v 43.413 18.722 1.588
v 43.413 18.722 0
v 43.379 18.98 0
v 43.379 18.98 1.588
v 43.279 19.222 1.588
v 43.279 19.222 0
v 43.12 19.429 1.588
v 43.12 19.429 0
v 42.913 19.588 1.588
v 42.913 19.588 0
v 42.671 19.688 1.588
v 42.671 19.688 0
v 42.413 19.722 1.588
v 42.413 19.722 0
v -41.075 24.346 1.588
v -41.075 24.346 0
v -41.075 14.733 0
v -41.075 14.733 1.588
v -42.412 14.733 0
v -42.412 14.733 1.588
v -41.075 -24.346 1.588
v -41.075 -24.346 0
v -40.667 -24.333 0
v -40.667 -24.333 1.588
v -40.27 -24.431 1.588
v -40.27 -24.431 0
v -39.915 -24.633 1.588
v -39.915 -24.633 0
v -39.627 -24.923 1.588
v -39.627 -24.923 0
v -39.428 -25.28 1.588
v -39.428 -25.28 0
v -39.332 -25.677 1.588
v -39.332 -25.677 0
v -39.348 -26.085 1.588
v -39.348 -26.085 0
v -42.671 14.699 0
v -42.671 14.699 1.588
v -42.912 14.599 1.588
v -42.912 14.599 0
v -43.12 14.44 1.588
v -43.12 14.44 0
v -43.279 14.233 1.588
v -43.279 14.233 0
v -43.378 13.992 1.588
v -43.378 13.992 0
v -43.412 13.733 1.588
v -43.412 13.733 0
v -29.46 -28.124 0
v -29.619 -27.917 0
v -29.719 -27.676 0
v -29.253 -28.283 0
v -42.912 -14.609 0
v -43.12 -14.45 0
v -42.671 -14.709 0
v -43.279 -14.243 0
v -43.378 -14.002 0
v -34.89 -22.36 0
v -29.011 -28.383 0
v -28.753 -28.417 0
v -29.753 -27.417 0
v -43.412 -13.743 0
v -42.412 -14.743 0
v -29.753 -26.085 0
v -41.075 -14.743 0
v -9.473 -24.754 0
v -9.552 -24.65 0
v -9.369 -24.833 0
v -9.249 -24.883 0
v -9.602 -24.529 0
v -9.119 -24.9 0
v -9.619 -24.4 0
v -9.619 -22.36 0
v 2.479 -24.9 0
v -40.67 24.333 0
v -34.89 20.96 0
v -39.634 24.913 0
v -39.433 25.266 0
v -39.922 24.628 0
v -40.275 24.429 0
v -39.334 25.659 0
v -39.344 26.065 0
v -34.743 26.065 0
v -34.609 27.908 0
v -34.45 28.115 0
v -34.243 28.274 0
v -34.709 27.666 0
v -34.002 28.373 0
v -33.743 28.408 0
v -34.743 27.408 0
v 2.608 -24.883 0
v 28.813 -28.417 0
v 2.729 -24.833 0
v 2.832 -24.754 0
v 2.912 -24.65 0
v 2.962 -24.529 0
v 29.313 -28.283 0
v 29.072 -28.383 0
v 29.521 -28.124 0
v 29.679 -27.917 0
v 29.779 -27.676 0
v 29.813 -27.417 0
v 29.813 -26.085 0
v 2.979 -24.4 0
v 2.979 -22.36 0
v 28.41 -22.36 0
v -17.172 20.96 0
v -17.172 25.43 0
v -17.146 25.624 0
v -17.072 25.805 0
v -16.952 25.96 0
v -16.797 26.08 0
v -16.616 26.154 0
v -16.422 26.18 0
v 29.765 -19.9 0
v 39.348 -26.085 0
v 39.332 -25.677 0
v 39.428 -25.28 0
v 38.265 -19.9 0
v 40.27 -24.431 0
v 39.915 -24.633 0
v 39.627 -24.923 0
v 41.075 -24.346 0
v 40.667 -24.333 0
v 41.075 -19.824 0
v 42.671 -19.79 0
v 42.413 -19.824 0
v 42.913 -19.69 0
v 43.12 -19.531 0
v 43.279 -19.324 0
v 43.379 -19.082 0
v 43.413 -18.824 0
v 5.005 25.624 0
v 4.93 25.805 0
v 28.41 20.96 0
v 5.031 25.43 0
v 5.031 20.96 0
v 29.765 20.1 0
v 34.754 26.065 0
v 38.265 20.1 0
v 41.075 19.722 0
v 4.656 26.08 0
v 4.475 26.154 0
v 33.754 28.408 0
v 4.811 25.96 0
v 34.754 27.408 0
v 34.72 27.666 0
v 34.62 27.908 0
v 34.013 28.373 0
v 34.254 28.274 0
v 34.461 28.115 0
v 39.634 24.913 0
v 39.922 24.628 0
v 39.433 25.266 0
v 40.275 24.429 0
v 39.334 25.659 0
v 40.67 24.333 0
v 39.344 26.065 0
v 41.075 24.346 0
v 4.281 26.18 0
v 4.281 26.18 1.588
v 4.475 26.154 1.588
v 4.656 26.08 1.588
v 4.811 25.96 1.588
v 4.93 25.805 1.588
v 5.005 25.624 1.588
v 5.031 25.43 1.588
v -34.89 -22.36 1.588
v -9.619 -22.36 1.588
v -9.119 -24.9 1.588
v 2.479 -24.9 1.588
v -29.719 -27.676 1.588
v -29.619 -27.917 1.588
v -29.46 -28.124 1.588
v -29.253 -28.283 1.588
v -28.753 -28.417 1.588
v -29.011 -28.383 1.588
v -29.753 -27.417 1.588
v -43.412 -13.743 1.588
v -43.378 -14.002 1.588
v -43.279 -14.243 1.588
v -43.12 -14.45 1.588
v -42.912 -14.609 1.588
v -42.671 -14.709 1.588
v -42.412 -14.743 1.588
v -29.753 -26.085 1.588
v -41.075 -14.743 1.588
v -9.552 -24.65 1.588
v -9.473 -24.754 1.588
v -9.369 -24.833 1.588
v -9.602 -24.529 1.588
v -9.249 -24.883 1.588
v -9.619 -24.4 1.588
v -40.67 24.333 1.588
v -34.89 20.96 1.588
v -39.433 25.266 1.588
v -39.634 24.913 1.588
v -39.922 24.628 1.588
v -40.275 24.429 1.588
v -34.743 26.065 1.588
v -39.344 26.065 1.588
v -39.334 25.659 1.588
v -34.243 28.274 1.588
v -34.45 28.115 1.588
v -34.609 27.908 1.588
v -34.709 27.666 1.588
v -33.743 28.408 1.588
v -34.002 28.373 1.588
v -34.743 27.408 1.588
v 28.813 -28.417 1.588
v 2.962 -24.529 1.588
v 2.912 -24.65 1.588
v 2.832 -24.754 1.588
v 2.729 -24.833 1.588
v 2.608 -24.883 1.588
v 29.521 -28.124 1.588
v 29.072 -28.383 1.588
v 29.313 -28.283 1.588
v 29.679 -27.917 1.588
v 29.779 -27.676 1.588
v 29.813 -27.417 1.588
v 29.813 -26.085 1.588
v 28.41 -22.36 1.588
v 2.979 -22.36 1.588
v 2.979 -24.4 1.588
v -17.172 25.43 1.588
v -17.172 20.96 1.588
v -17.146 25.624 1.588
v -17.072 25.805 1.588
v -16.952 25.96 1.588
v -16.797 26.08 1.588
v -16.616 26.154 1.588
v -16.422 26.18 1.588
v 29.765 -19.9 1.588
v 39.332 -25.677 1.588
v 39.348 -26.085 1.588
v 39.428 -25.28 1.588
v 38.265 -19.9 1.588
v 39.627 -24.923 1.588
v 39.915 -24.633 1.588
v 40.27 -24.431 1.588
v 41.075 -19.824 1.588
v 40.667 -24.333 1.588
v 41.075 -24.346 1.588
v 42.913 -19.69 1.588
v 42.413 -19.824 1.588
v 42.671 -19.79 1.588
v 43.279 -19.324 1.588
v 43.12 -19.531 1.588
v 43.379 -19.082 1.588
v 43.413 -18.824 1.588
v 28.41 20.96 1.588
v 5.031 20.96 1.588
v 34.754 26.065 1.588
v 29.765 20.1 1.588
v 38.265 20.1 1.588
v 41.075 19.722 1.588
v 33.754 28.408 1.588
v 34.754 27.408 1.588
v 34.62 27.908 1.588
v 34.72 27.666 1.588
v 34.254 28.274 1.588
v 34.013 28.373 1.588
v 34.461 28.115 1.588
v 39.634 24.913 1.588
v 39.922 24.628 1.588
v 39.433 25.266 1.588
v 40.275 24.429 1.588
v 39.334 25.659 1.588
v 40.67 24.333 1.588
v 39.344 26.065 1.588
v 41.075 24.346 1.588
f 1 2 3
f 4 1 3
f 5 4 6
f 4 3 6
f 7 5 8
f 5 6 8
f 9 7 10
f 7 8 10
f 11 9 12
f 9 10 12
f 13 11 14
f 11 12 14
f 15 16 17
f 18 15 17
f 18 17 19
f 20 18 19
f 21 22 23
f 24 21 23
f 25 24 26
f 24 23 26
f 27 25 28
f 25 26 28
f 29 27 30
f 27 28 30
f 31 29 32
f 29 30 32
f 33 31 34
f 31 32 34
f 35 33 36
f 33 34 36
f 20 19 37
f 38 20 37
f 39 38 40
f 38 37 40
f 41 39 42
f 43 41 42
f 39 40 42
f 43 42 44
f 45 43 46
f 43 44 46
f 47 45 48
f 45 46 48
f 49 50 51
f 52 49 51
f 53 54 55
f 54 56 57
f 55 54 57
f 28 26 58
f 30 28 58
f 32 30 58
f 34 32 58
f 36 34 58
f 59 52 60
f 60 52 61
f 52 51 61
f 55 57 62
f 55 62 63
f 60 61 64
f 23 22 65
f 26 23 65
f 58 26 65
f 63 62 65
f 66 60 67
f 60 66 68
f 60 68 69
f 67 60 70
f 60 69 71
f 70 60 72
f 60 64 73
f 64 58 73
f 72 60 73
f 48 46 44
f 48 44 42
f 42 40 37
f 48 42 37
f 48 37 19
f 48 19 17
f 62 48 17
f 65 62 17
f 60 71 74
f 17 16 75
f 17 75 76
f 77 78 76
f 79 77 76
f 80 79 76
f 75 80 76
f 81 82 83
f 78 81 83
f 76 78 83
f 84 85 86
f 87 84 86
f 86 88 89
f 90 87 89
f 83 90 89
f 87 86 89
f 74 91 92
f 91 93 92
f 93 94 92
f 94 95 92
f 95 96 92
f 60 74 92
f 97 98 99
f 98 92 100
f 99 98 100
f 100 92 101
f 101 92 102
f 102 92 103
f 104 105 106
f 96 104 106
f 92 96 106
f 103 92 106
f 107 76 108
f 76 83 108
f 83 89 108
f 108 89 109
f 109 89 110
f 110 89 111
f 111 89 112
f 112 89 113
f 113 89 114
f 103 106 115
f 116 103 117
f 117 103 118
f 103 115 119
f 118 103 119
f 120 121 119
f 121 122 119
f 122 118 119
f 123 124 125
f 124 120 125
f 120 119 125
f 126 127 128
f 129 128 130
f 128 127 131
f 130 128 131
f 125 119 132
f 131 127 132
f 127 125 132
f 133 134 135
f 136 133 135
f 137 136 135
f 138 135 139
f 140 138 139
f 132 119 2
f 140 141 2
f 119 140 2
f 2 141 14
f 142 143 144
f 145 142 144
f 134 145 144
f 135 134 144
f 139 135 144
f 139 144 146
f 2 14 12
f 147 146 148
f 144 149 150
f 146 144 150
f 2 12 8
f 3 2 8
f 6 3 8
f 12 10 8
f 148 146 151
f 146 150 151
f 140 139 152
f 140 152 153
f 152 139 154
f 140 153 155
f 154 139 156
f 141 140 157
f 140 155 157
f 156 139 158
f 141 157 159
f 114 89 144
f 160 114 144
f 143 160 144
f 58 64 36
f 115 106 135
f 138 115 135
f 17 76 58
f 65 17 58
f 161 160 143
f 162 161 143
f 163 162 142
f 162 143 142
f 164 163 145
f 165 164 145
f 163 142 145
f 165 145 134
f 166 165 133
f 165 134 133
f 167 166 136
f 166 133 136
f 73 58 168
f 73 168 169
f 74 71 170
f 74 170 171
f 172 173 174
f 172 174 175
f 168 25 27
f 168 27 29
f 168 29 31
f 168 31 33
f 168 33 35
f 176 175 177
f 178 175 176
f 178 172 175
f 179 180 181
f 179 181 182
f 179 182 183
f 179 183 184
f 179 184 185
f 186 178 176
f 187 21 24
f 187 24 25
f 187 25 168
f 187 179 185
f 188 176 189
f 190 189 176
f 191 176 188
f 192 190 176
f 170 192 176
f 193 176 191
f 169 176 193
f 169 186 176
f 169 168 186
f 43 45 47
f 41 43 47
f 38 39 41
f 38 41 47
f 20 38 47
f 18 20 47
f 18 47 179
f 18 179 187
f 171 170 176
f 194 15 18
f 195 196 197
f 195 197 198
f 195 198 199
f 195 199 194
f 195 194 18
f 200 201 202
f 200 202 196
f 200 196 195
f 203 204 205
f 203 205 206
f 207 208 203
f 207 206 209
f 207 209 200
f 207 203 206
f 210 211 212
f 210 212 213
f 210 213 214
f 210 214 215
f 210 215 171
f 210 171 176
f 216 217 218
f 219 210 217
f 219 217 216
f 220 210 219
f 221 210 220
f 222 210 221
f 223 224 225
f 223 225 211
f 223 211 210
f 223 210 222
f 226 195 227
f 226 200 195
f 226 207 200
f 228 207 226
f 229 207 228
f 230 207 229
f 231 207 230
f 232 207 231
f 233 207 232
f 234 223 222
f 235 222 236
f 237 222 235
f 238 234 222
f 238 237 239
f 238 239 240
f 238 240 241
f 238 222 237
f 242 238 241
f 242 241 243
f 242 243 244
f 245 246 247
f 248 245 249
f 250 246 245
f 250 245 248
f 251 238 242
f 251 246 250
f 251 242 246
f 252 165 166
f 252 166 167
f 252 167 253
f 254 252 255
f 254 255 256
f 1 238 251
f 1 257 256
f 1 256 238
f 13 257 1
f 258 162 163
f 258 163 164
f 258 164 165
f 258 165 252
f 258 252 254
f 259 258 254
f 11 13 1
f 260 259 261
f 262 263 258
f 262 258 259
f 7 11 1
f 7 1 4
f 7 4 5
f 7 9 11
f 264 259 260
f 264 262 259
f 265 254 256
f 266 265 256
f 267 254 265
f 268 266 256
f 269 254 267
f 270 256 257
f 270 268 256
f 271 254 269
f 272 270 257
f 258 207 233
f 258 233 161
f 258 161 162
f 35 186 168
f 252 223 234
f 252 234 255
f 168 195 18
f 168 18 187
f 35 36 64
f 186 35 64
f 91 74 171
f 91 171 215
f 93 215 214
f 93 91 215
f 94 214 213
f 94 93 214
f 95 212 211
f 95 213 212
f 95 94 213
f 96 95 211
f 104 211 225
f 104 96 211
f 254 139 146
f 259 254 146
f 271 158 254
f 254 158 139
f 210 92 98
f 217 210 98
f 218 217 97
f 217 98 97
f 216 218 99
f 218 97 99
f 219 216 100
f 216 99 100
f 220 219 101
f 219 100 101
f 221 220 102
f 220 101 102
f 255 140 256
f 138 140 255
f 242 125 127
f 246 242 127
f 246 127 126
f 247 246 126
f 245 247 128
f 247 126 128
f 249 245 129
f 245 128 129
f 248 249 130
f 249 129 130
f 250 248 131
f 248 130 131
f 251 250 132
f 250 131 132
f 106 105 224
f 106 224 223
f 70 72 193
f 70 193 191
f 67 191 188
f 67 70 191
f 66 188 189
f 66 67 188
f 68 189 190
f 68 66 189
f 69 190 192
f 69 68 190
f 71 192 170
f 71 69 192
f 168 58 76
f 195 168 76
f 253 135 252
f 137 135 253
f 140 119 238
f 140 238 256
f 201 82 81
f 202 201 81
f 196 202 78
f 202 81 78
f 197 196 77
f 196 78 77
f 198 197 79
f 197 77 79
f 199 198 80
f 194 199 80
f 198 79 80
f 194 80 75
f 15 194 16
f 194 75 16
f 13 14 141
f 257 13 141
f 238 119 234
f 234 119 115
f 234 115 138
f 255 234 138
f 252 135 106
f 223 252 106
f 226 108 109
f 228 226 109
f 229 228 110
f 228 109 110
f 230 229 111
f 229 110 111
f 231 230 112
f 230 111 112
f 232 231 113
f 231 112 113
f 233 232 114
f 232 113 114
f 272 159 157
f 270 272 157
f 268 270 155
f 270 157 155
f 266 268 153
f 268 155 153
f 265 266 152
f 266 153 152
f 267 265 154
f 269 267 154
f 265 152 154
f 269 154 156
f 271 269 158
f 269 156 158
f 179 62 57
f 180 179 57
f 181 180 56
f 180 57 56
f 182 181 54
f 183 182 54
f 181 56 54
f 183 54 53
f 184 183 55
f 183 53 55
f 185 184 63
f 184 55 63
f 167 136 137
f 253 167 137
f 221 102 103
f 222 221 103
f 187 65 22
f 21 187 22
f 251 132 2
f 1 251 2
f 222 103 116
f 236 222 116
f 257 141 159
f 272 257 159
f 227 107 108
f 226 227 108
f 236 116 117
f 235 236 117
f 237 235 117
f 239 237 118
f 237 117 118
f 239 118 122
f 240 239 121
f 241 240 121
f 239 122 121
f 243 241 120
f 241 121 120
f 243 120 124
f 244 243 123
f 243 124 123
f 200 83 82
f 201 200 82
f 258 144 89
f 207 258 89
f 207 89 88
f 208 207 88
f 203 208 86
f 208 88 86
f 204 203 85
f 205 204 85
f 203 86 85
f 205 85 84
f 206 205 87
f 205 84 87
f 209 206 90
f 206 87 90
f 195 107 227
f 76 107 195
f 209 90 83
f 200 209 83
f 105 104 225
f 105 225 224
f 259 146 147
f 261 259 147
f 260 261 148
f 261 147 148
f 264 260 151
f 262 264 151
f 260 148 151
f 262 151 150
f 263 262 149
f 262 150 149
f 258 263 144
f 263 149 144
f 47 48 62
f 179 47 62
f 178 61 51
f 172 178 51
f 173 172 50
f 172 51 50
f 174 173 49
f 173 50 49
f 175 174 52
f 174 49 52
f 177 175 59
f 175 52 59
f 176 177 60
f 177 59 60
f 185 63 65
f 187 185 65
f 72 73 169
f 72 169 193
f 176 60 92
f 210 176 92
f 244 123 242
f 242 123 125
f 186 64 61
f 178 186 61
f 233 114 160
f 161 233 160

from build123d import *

# Parameters (mm, degrees)
BOSS_EXTRUDE1_DEPTH = 1.5875
SKETCH3_R           = 1.5
CUT_EXTRUDE1_DEPTH  = 1.5875
SKETCH4_W           = 8.5
SKETCH4_H           = 40
CUT_EXTRUDE2_DEPTH  = 52.910426175
CUT_EXTRUDE3_DEPTH  = 52.910426175


with BuildPart() as part:
    # Sketch2 → Boss-Extrude1 (new body)
    with BuildSketch(Plane.XY):
        with BuildLine():
            Line((41.075, 26.06487963), (34.753871084, 26.06487963))
            Line((34.753871084, 26.06487963), (34.753871084, 27.4075156))
            ThreePointArc((34.753871084, 27.4075156), (34.460977865, 28.114622381), (33.753871084, 28.4075156))
            Line((33.753871084, 28.4075156), (-33.743187521, 28.4075156))
            ThreePointArc((-33.743187521, 28.4075156), (-34.450294302, 28.114622381), (-34.743187521, 27.4075156))
            Line((-34.743187521, 27.4075156), (-34.743187521, 26.06487963))
            Line((-34.743187521, 26.06487963), (-41.075, 26.06487963))
            Line((-41.075, 26.06487963), (-41.075, 14.733067151))
            Line((-41.075, 14.733067151), (-42.4124996, 14.733067151))
            ThreePointArc((-42.4124996, 14.733067151), (-43.119606381, 14.440173932), (-43.4124996, 13.733067151))
            Line((-43.4124996, 13.733067151), (-43.4124996, -13.743187521))
            ThreePointArc((-43.4124996, -13.743187521), (-43.119606381, -14.450294302), (-42.4124996, -14.743187521))
            Line((-42.4124996, -14.743187521), (-41.075, -14.743187521))
            Line((-41.075, -14.743187521), (-41.075, -26.08512037))
            Line((-41.075, -26.08512037), (-29.75263109, -26.08512037))
            Line((-29.75263109, -26.08512037), (-29.75263109, -27.41690205))
            ThreePointArc((-29.75263109, -27.41690205), (-29.459737872, -28.124008831), (-28.75263109, -28.41690205))
            Line((-28.75263109, -28.41690205), (28.813455755, -28.41690205))
            ThreePointArc((28.813455755, -28.41690205), (29.520562536, -28.124008831), (29.813455755, -27.41690205))
            Line((29.813455755, -27.41690205), (29.813455755, -26.08512037))
            Line((29.813455755, -26.08512037), (41.075, -26.08512037))
            Line((41.075, -26.08512037), (41.075, -19.823575131))
            Line((41.075, -19.823575131), (42.412577294, -19.823575131))
            ThreePointArc((42.412577294, -19.823575131), (43.119684076, -19.530681912), (43.412577294, -18.823575131))
            Line((43.412577294, -18.823575131), (43.412577294, 18.721630511))
            ThreePointArc((43.412577294, 18.721630511), (43.119684076, 19.428737292), (42.412577294, 19.721630511))
            Line((42.412577294, 19.721630511), (41.075, 19.721630511))
            Line((41.075, 19.721630511), (41.075, 26.06487963))
        make_face()
    extrude(amount=BOSS_EXTRUDE1_DEPTH)

    # Sketch3 → Cut-Extrude1 (cut)
    with BuildSketch(Plane(origin=(0, 0, 0), x_dir=(-1, 0, 0), z_dir=(0, 0, -1))):
        with Locations((40.825, 25.825)):
            Circle(SKETCH3_R)
        with Locations((-40.825, 25.825)):
            Circle(SKETCH3_R)
        with Locations((-40.825, -25.825)):
            Circle(SKETCH3_R)
        with Locations((40.825, -25.825)):
            Circle(SKETCH3_R)
    extrude(amount=-CUT_EXTRUDE1_DEPTH, mode=Mode.SUBTRACT)

    # Sketch4 → Cut-Extrude2 (cut, through all)
    with BuildSketch(Plane(origin=(0, 0, 0), x_dir=(-1, 0, 0), z_dir=(0, 0, -1))):
        Polygon((-28.41, -20.51), (-28.41, 20.96), (34.89, 20.96), (34.89, -20.51), (34.89, -22.36), (-28.41, -22.36), align=None)
        with Locations((-34.015313808, 0.1)):
            Rectangle(SKETCH4_W, SKETCH4_H)
    extrude(amount=-CUT_EXTRUDE2_DEPTH, mode=Mode.SUBTRACT)

    # Sketch6 → Cut-Extrude3 (cut, through all)
    with BuildSketch(Plane(origin=(0, 0, 0), x_dir=(-1, 0, 0), z_dir=(0, 0, -1))):
        with BuildLine():
            Line((16.422031316, 26.18), (-4.280813202, 26.18))
            ThreePointArc((-4.280813202, 26.18), (-4.811143288, 25.960330086), (-5.030813202, 25.43))
            Line((-5.030813202, 25.43), (-5.030813202, 20.96))
            Line((-5.030813202, 20.96), (17.172031316, 20.96))
            Line((17.172031316, 20.96), (17.172031316, 25.43))
            ThreePointArc((17.172031316, 25.43), (16.952361402, 25.960330086), (16.422031316, 26.18))
        make_face()
        with BuildLine():
            Line((-2.978741709, -22.36), (9.619202587, -22.36))
            Line((9.619202587, -22.36), (9.619202587, -24.4))
            ThreePointArc((9.619202587, -24.4), (9.472755977, -24.753553391), (9.119202587, -24.9))
            Line((9.119202587, -24.9), (-2.478741709, -24.9))
            ThreePointArc((-2.478741709, -24.9), (-2.832295099, -24.753553391), (-2.978741709, -24.4))
            Line((-2.978741709, -24.4), (-2.978741709, -22.36))
        make_face()
    extrude(amount=-CUT_EXTRUDE3_DEPTH, mode=Mode.SUBTRACT)


solid = part.part
